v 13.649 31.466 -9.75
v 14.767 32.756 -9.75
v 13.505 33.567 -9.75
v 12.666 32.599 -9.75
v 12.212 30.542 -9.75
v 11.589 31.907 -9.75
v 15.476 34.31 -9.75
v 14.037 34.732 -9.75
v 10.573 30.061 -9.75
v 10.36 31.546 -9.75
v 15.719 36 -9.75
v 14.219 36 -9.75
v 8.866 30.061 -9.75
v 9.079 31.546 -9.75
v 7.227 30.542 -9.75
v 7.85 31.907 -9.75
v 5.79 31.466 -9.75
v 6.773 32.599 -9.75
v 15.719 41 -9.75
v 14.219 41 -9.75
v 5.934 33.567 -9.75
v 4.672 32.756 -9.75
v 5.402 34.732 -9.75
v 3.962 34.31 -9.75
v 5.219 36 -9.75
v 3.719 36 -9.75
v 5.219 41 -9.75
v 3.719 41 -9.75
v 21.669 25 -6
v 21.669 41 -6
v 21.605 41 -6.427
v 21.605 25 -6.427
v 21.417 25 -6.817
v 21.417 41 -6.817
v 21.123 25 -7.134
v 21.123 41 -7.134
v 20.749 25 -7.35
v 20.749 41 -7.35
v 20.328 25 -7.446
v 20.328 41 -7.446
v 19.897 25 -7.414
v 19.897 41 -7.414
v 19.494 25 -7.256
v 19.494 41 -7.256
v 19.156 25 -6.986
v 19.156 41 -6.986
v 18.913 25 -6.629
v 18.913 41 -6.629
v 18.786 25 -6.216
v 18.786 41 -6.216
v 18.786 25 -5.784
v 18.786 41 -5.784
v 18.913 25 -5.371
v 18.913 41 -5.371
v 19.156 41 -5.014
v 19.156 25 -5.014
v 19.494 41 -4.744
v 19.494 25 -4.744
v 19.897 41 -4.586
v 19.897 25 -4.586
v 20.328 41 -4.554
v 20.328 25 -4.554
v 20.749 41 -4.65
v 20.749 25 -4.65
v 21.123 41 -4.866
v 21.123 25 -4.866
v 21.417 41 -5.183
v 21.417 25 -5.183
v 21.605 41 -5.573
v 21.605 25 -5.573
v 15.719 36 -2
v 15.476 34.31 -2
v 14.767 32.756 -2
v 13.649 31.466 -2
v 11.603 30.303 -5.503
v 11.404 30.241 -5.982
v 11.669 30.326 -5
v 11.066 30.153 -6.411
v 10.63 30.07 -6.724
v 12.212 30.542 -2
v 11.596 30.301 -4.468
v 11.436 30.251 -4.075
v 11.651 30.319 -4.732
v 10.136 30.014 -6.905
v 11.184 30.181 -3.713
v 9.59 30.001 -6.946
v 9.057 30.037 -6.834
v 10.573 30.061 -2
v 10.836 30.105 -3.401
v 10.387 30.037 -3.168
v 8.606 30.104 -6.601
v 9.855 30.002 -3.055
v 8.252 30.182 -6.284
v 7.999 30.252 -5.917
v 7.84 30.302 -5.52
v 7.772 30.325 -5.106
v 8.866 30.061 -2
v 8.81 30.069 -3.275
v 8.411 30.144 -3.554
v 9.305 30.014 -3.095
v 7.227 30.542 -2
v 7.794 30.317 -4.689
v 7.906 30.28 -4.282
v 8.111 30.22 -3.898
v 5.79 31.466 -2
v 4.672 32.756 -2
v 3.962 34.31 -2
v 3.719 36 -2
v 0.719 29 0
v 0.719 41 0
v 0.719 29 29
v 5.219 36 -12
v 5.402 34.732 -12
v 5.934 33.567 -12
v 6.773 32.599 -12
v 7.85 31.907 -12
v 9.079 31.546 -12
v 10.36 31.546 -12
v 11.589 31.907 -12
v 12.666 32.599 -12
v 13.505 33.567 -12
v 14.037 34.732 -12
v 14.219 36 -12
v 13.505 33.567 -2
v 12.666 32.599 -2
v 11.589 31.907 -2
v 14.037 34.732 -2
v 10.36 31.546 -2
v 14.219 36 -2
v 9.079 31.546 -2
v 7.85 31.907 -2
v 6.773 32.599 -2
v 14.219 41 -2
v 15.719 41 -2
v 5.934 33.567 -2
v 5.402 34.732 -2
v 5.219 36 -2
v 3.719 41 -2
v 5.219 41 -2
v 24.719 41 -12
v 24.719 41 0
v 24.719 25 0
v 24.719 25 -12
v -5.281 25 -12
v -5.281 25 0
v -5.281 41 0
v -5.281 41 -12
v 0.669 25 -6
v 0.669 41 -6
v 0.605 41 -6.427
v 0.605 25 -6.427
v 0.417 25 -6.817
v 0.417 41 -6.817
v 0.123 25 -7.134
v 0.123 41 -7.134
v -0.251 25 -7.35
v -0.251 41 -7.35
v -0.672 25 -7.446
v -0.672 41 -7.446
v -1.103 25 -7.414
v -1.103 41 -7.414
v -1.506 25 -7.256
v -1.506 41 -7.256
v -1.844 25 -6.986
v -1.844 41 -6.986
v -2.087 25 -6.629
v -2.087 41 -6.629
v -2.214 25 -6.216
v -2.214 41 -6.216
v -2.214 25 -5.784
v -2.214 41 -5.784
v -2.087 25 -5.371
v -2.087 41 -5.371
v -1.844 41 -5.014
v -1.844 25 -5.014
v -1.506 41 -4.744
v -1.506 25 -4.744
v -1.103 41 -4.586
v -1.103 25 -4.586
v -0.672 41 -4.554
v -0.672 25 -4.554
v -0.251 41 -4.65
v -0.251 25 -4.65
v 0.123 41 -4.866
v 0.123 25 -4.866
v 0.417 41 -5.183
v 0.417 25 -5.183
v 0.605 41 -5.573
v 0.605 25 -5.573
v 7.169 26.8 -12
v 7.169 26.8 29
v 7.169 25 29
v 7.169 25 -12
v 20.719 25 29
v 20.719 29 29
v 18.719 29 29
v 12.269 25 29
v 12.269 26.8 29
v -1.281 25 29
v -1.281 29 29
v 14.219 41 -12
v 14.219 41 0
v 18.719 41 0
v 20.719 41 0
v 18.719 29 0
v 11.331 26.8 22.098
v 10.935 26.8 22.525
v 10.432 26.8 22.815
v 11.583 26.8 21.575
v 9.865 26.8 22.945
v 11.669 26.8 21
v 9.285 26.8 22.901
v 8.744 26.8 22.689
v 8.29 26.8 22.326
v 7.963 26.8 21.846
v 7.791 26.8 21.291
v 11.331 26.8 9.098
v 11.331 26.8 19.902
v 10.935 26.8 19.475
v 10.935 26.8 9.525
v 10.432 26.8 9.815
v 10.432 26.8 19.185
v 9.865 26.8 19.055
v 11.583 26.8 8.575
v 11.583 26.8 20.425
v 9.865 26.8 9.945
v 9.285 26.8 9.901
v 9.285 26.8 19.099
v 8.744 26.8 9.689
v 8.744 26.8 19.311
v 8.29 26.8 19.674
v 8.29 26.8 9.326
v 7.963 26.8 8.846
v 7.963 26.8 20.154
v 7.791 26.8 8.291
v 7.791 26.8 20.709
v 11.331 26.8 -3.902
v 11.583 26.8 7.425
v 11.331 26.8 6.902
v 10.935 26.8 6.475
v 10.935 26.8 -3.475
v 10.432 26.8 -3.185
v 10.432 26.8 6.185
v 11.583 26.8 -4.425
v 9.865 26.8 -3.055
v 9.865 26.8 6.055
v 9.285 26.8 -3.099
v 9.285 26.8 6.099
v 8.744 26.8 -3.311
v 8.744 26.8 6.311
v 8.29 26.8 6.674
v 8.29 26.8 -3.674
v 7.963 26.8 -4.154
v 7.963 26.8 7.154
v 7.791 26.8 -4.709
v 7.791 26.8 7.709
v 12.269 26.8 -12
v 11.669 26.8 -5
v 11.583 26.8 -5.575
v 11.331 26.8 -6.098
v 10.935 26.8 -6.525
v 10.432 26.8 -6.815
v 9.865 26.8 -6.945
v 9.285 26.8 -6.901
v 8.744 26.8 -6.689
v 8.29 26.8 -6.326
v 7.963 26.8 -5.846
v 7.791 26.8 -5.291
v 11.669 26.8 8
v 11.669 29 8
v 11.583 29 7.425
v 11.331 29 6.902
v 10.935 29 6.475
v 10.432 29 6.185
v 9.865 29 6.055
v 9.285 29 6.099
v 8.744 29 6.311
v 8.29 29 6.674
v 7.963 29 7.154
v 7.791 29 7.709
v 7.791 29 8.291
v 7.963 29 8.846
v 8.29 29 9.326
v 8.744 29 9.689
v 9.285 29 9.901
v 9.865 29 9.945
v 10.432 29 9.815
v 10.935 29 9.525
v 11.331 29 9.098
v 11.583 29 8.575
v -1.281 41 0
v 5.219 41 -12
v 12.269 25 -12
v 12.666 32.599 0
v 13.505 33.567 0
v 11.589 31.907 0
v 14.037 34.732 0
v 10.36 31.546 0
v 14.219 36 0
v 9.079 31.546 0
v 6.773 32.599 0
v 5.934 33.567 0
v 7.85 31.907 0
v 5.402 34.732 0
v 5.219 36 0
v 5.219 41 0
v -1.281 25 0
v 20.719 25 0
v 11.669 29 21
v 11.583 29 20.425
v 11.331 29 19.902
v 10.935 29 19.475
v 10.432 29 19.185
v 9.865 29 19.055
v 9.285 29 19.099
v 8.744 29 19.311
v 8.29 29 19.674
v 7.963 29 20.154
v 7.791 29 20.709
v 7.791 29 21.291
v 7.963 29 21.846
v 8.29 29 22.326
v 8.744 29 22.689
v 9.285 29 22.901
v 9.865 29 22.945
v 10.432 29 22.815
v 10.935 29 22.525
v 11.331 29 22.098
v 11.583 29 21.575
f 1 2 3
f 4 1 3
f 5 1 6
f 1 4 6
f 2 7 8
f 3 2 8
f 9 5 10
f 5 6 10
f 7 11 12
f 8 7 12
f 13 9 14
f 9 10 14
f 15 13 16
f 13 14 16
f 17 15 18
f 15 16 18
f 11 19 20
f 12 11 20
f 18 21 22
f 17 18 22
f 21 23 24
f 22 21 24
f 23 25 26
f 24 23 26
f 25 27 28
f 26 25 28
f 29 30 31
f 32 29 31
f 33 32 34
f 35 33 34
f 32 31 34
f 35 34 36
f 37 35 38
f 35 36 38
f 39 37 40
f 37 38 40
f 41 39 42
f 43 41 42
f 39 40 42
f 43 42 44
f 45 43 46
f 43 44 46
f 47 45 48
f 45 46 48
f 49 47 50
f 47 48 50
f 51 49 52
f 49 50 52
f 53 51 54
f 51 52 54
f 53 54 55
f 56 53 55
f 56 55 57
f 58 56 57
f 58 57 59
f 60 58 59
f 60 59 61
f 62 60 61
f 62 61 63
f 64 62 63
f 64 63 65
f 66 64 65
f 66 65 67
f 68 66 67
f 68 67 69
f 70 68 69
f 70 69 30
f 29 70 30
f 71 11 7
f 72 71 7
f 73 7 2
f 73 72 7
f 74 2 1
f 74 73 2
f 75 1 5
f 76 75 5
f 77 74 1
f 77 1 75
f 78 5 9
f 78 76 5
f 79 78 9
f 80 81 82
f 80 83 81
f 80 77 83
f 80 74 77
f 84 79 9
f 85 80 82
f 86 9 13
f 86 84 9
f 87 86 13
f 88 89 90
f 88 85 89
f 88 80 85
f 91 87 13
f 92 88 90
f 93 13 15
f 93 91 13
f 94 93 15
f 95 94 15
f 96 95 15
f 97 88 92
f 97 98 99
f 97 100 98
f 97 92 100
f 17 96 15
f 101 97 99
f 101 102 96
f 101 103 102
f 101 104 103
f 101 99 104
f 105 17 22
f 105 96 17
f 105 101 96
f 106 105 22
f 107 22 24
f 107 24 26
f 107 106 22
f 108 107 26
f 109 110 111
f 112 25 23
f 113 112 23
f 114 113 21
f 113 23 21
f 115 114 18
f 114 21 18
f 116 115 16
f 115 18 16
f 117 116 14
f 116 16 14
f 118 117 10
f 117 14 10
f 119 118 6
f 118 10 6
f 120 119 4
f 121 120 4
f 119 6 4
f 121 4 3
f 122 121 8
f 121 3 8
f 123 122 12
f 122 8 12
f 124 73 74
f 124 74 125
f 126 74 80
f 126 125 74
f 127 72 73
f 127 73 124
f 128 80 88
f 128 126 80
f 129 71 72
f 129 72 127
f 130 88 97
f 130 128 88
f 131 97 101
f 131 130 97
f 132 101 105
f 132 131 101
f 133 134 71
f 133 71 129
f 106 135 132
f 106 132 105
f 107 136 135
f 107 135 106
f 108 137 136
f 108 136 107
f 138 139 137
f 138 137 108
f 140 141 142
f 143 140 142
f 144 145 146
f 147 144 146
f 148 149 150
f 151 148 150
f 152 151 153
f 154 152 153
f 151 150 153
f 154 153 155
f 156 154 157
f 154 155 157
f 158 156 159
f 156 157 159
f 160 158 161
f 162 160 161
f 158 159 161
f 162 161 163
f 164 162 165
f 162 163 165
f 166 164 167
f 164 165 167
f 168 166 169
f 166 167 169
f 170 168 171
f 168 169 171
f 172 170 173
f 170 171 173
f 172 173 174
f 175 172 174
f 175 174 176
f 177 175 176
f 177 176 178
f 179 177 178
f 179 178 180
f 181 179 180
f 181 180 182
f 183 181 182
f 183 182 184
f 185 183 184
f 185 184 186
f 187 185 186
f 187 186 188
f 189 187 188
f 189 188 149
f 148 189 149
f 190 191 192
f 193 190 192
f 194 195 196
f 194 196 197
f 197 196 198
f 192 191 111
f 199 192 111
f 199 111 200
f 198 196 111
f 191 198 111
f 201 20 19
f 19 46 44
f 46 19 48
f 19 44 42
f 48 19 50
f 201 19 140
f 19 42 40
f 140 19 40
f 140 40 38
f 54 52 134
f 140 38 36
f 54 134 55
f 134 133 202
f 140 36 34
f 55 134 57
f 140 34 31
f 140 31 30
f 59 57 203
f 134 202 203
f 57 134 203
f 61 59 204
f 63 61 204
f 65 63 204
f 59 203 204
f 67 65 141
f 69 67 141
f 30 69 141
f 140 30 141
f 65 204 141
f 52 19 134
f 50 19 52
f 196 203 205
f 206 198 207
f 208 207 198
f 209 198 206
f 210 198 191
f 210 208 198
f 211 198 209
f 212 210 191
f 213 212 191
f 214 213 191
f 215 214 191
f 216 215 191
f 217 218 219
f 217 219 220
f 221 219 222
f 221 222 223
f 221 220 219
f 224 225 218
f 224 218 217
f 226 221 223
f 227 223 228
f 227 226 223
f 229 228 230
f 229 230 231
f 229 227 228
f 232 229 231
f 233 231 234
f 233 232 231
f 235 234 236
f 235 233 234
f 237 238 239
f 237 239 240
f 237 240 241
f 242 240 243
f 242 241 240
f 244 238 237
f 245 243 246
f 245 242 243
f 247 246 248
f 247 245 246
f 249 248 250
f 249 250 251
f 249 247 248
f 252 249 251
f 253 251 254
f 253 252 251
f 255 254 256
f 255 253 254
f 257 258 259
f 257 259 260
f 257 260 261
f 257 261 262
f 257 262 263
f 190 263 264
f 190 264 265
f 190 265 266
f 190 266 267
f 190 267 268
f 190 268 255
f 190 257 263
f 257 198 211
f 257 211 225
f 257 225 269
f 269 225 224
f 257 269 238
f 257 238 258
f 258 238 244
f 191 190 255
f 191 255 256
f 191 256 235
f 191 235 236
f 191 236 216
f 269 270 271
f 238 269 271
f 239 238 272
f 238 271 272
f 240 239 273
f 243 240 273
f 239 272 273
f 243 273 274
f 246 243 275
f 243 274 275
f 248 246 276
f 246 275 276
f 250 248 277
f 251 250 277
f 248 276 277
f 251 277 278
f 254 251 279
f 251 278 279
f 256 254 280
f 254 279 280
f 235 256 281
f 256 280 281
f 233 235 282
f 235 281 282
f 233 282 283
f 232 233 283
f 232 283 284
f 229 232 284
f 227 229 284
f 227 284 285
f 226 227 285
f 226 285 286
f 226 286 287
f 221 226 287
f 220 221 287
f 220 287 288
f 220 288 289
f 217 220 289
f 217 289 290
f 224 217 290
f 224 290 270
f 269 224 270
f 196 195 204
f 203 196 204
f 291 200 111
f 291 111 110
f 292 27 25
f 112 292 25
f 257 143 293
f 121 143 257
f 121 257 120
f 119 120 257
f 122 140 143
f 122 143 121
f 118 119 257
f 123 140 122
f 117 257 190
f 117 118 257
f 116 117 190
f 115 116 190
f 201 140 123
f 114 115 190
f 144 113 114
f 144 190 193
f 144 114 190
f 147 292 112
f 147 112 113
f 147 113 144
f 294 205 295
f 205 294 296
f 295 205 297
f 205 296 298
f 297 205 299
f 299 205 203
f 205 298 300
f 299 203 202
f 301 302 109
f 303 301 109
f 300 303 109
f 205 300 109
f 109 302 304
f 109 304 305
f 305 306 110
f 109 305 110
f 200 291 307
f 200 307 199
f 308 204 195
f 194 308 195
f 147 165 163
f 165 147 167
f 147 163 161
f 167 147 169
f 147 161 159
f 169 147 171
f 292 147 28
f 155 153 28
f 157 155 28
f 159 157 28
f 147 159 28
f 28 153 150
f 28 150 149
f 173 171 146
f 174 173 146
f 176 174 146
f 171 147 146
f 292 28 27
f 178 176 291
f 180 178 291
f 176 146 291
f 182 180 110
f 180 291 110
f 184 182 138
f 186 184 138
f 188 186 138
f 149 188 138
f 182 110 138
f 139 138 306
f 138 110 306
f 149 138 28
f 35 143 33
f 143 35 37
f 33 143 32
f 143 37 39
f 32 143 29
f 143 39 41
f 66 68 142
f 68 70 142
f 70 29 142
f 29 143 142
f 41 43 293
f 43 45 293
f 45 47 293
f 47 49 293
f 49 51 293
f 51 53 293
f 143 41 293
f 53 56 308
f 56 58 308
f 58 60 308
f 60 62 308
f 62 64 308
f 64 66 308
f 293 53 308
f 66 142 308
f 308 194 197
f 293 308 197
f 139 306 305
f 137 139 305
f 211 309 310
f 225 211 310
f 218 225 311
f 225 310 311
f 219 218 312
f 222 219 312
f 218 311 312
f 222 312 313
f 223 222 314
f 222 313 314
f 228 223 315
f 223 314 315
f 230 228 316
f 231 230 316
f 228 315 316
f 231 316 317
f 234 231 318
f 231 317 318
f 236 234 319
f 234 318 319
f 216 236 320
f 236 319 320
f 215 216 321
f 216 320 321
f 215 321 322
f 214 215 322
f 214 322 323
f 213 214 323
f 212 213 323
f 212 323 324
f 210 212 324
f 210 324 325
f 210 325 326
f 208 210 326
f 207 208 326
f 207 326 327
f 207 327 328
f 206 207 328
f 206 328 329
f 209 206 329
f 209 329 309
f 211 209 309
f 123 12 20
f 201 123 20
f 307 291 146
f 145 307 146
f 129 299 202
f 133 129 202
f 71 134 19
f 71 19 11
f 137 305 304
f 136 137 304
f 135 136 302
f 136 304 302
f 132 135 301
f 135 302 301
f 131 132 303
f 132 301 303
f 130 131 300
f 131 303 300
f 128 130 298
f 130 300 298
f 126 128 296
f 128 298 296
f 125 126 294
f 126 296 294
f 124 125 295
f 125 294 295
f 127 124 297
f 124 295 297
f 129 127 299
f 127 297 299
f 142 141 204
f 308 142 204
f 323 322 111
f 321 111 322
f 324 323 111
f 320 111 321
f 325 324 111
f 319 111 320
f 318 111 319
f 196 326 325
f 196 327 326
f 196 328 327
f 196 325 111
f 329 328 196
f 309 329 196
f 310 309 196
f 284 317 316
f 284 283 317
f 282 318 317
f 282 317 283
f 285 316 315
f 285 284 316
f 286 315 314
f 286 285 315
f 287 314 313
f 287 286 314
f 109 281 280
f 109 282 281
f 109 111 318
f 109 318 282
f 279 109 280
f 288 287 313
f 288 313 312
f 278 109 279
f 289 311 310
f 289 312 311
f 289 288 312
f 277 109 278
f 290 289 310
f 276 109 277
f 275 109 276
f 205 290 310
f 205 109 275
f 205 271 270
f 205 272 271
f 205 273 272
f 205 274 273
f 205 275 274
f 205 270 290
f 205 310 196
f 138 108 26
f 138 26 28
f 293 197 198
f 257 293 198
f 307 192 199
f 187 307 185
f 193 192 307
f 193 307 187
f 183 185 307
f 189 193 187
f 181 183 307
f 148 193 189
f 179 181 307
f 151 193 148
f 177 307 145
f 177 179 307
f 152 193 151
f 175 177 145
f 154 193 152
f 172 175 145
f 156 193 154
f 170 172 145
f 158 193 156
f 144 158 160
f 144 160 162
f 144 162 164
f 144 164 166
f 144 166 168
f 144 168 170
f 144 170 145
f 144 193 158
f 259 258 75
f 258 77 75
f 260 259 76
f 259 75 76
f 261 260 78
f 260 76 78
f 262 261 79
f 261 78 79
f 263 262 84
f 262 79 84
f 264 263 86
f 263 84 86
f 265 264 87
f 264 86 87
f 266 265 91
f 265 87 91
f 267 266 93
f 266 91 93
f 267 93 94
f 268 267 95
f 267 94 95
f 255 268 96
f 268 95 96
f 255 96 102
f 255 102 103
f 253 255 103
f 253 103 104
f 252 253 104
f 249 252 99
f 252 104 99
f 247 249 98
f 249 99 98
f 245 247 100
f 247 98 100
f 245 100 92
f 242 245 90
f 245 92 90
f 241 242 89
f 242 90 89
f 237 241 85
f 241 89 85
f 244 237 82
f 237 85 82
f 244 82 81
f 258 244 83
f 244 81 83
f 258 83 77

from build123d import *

# Parameters (mm, degrees)
BOSS_EXTRUDE1_DEPTH = 12
CUT_EXTRUDE1_START  = -2
CUT_EXTRUDE1_DEPTH  = 7.75
SKETCH3_R           = 1.45
CUT_EXTRUDE2_DEPTH  = 18
BOSS_EXTRUDE2_DEPTH = 29
SKETCH5_R           = 1.95
CUT_EXTRUDE3_DEPTH  = 14.5
BOSS_EXTRUDE3_DEPTH = 2
BOSS_EXTRUDE4_START = -22
BOSS_EXTRUDE4_DEPTH = 2


with BuildPart() as part:
    # Sketch1 → Boss-Extrude1 (new body)
    with BuildSketch(Plane.XY):
        with BuildLine():
            Line((-5.280588843, 25), (-5.280588843, 41))
            Line((-5.280588843, 41), (5.219411157, 41))
            Line((5.219411157, 41), (5.219411157, 36))
            ThreePointArc((5.219411157, 36), (9.719411157, 31.5), (14.219411157, 36))
            Line((14.219411157, 36), (14.219411157, 41))
            Line((14.219411157, 41), (24.719411157, 41))
            Line((24.719411157, 41), (24.719411157, 25))
            Line((24.719411157, 25), (12.269411157, 25))
            Line((12.269411157, 25), (12.269411157, 26.8))
            Line((12.269411157, 26.8), (7.169411157, 26.8))
            Line((7.169411157, 26.8), (7.169411157, 25))
            Line((7.169411157, 25), (-5.280588843, 25))
        make_face()
    extrude(amount=-BOSS_EXTRUDE1_DEPTH)

    # Sketch2 → Cut-Extrude1 (cut)
    with BuildSketch(Plane.XY.offset(CUT_EXTRUDE1_START)):
        with BuildLine():
            Line((3.719411157, 36), (3.719411157, 41))
            Line((3.719411157, 41), (15.719411157, 41))
            Line((15.719411157, 41), (15.719411157, 36))
            ThreePointArc((15.719411157, 36), (9.719411157, 30), (3.719411157, 36))
        make_face()
    extrude(amount=-CUT_EXTRUDE1_DEPTH, mode=Mode.SUBTRACT)

    # Sketch3 → Cut-Extrude2 (cut)
    with BuildSketch(Plane(origin=(0, 41, 0), x_dir=(1, 0, 0), z_dir=(0, 1, 0))):
        with Locations((20.219411157, 6)):
            Circle(SKETCH3_R)
        with Locations((-0.780588843, 6)):
            Circle(SKETCH3_R)
    extrude(amount=-CUT_EXTRUDE2_DEPTH, mode=Mode.SUBTRACT)

    # Sketch4 → Boss-Extrude2 (add)
    with BuildSketch(Plane.XY):
        Polygon((-1.280588843, 25), (-1.280588843, 29), (20.719411157, 29), (20.719411157, 25), (12.269411157, 25), (12.269411157, 26.8), (7.169411157, 26.8), (7.169411157, 25), align=None)
    extrude(amount=BOSS_EXTRUDE2_DEPTH)

    # Sketch5 → Cut-Extrude3 (cut, symmetric)
    with BuildSketch(Plane(origin=(0, 29, 0), x_dir=(1, 0, 0), z_dir=(0, 1, 0))):
        with Locations((9.719411157, -21)):
            Circle(SKETCH5_R)
        with Locations((9.719411157, -8)):
            Circle(SKETCH5_R)
        with Locations((9.719411157, 5)):
            Circle(SKETCH5_R)
    extrude(amount=CUT_EXTRUDE3_DEPTH, both=True, mode=Mode.SUBTRACT)

    # Sketch6 → Boss-Extrude3 (add)
    with BuildSketch(Plane.ZY.offset(1.280588843)):
        Polygon((29, 29), (0, 41), (0, 29), align=None)
    extrude(amount=-BOSS_EXTRUDE3_DEPTH)

    # Sketch6<2> → Boss-Extrude4 (add)
    with BuildSketch(Plane.ZY.offset(1.280588843).offset(BOSS_EXTRUDE4_START)):
        Polygon((29, 29), (0, 41), (0, 29), align=None)
    extrude(amount=BOSS_EXTRUDE4_DEPTH)


solid = part.part
